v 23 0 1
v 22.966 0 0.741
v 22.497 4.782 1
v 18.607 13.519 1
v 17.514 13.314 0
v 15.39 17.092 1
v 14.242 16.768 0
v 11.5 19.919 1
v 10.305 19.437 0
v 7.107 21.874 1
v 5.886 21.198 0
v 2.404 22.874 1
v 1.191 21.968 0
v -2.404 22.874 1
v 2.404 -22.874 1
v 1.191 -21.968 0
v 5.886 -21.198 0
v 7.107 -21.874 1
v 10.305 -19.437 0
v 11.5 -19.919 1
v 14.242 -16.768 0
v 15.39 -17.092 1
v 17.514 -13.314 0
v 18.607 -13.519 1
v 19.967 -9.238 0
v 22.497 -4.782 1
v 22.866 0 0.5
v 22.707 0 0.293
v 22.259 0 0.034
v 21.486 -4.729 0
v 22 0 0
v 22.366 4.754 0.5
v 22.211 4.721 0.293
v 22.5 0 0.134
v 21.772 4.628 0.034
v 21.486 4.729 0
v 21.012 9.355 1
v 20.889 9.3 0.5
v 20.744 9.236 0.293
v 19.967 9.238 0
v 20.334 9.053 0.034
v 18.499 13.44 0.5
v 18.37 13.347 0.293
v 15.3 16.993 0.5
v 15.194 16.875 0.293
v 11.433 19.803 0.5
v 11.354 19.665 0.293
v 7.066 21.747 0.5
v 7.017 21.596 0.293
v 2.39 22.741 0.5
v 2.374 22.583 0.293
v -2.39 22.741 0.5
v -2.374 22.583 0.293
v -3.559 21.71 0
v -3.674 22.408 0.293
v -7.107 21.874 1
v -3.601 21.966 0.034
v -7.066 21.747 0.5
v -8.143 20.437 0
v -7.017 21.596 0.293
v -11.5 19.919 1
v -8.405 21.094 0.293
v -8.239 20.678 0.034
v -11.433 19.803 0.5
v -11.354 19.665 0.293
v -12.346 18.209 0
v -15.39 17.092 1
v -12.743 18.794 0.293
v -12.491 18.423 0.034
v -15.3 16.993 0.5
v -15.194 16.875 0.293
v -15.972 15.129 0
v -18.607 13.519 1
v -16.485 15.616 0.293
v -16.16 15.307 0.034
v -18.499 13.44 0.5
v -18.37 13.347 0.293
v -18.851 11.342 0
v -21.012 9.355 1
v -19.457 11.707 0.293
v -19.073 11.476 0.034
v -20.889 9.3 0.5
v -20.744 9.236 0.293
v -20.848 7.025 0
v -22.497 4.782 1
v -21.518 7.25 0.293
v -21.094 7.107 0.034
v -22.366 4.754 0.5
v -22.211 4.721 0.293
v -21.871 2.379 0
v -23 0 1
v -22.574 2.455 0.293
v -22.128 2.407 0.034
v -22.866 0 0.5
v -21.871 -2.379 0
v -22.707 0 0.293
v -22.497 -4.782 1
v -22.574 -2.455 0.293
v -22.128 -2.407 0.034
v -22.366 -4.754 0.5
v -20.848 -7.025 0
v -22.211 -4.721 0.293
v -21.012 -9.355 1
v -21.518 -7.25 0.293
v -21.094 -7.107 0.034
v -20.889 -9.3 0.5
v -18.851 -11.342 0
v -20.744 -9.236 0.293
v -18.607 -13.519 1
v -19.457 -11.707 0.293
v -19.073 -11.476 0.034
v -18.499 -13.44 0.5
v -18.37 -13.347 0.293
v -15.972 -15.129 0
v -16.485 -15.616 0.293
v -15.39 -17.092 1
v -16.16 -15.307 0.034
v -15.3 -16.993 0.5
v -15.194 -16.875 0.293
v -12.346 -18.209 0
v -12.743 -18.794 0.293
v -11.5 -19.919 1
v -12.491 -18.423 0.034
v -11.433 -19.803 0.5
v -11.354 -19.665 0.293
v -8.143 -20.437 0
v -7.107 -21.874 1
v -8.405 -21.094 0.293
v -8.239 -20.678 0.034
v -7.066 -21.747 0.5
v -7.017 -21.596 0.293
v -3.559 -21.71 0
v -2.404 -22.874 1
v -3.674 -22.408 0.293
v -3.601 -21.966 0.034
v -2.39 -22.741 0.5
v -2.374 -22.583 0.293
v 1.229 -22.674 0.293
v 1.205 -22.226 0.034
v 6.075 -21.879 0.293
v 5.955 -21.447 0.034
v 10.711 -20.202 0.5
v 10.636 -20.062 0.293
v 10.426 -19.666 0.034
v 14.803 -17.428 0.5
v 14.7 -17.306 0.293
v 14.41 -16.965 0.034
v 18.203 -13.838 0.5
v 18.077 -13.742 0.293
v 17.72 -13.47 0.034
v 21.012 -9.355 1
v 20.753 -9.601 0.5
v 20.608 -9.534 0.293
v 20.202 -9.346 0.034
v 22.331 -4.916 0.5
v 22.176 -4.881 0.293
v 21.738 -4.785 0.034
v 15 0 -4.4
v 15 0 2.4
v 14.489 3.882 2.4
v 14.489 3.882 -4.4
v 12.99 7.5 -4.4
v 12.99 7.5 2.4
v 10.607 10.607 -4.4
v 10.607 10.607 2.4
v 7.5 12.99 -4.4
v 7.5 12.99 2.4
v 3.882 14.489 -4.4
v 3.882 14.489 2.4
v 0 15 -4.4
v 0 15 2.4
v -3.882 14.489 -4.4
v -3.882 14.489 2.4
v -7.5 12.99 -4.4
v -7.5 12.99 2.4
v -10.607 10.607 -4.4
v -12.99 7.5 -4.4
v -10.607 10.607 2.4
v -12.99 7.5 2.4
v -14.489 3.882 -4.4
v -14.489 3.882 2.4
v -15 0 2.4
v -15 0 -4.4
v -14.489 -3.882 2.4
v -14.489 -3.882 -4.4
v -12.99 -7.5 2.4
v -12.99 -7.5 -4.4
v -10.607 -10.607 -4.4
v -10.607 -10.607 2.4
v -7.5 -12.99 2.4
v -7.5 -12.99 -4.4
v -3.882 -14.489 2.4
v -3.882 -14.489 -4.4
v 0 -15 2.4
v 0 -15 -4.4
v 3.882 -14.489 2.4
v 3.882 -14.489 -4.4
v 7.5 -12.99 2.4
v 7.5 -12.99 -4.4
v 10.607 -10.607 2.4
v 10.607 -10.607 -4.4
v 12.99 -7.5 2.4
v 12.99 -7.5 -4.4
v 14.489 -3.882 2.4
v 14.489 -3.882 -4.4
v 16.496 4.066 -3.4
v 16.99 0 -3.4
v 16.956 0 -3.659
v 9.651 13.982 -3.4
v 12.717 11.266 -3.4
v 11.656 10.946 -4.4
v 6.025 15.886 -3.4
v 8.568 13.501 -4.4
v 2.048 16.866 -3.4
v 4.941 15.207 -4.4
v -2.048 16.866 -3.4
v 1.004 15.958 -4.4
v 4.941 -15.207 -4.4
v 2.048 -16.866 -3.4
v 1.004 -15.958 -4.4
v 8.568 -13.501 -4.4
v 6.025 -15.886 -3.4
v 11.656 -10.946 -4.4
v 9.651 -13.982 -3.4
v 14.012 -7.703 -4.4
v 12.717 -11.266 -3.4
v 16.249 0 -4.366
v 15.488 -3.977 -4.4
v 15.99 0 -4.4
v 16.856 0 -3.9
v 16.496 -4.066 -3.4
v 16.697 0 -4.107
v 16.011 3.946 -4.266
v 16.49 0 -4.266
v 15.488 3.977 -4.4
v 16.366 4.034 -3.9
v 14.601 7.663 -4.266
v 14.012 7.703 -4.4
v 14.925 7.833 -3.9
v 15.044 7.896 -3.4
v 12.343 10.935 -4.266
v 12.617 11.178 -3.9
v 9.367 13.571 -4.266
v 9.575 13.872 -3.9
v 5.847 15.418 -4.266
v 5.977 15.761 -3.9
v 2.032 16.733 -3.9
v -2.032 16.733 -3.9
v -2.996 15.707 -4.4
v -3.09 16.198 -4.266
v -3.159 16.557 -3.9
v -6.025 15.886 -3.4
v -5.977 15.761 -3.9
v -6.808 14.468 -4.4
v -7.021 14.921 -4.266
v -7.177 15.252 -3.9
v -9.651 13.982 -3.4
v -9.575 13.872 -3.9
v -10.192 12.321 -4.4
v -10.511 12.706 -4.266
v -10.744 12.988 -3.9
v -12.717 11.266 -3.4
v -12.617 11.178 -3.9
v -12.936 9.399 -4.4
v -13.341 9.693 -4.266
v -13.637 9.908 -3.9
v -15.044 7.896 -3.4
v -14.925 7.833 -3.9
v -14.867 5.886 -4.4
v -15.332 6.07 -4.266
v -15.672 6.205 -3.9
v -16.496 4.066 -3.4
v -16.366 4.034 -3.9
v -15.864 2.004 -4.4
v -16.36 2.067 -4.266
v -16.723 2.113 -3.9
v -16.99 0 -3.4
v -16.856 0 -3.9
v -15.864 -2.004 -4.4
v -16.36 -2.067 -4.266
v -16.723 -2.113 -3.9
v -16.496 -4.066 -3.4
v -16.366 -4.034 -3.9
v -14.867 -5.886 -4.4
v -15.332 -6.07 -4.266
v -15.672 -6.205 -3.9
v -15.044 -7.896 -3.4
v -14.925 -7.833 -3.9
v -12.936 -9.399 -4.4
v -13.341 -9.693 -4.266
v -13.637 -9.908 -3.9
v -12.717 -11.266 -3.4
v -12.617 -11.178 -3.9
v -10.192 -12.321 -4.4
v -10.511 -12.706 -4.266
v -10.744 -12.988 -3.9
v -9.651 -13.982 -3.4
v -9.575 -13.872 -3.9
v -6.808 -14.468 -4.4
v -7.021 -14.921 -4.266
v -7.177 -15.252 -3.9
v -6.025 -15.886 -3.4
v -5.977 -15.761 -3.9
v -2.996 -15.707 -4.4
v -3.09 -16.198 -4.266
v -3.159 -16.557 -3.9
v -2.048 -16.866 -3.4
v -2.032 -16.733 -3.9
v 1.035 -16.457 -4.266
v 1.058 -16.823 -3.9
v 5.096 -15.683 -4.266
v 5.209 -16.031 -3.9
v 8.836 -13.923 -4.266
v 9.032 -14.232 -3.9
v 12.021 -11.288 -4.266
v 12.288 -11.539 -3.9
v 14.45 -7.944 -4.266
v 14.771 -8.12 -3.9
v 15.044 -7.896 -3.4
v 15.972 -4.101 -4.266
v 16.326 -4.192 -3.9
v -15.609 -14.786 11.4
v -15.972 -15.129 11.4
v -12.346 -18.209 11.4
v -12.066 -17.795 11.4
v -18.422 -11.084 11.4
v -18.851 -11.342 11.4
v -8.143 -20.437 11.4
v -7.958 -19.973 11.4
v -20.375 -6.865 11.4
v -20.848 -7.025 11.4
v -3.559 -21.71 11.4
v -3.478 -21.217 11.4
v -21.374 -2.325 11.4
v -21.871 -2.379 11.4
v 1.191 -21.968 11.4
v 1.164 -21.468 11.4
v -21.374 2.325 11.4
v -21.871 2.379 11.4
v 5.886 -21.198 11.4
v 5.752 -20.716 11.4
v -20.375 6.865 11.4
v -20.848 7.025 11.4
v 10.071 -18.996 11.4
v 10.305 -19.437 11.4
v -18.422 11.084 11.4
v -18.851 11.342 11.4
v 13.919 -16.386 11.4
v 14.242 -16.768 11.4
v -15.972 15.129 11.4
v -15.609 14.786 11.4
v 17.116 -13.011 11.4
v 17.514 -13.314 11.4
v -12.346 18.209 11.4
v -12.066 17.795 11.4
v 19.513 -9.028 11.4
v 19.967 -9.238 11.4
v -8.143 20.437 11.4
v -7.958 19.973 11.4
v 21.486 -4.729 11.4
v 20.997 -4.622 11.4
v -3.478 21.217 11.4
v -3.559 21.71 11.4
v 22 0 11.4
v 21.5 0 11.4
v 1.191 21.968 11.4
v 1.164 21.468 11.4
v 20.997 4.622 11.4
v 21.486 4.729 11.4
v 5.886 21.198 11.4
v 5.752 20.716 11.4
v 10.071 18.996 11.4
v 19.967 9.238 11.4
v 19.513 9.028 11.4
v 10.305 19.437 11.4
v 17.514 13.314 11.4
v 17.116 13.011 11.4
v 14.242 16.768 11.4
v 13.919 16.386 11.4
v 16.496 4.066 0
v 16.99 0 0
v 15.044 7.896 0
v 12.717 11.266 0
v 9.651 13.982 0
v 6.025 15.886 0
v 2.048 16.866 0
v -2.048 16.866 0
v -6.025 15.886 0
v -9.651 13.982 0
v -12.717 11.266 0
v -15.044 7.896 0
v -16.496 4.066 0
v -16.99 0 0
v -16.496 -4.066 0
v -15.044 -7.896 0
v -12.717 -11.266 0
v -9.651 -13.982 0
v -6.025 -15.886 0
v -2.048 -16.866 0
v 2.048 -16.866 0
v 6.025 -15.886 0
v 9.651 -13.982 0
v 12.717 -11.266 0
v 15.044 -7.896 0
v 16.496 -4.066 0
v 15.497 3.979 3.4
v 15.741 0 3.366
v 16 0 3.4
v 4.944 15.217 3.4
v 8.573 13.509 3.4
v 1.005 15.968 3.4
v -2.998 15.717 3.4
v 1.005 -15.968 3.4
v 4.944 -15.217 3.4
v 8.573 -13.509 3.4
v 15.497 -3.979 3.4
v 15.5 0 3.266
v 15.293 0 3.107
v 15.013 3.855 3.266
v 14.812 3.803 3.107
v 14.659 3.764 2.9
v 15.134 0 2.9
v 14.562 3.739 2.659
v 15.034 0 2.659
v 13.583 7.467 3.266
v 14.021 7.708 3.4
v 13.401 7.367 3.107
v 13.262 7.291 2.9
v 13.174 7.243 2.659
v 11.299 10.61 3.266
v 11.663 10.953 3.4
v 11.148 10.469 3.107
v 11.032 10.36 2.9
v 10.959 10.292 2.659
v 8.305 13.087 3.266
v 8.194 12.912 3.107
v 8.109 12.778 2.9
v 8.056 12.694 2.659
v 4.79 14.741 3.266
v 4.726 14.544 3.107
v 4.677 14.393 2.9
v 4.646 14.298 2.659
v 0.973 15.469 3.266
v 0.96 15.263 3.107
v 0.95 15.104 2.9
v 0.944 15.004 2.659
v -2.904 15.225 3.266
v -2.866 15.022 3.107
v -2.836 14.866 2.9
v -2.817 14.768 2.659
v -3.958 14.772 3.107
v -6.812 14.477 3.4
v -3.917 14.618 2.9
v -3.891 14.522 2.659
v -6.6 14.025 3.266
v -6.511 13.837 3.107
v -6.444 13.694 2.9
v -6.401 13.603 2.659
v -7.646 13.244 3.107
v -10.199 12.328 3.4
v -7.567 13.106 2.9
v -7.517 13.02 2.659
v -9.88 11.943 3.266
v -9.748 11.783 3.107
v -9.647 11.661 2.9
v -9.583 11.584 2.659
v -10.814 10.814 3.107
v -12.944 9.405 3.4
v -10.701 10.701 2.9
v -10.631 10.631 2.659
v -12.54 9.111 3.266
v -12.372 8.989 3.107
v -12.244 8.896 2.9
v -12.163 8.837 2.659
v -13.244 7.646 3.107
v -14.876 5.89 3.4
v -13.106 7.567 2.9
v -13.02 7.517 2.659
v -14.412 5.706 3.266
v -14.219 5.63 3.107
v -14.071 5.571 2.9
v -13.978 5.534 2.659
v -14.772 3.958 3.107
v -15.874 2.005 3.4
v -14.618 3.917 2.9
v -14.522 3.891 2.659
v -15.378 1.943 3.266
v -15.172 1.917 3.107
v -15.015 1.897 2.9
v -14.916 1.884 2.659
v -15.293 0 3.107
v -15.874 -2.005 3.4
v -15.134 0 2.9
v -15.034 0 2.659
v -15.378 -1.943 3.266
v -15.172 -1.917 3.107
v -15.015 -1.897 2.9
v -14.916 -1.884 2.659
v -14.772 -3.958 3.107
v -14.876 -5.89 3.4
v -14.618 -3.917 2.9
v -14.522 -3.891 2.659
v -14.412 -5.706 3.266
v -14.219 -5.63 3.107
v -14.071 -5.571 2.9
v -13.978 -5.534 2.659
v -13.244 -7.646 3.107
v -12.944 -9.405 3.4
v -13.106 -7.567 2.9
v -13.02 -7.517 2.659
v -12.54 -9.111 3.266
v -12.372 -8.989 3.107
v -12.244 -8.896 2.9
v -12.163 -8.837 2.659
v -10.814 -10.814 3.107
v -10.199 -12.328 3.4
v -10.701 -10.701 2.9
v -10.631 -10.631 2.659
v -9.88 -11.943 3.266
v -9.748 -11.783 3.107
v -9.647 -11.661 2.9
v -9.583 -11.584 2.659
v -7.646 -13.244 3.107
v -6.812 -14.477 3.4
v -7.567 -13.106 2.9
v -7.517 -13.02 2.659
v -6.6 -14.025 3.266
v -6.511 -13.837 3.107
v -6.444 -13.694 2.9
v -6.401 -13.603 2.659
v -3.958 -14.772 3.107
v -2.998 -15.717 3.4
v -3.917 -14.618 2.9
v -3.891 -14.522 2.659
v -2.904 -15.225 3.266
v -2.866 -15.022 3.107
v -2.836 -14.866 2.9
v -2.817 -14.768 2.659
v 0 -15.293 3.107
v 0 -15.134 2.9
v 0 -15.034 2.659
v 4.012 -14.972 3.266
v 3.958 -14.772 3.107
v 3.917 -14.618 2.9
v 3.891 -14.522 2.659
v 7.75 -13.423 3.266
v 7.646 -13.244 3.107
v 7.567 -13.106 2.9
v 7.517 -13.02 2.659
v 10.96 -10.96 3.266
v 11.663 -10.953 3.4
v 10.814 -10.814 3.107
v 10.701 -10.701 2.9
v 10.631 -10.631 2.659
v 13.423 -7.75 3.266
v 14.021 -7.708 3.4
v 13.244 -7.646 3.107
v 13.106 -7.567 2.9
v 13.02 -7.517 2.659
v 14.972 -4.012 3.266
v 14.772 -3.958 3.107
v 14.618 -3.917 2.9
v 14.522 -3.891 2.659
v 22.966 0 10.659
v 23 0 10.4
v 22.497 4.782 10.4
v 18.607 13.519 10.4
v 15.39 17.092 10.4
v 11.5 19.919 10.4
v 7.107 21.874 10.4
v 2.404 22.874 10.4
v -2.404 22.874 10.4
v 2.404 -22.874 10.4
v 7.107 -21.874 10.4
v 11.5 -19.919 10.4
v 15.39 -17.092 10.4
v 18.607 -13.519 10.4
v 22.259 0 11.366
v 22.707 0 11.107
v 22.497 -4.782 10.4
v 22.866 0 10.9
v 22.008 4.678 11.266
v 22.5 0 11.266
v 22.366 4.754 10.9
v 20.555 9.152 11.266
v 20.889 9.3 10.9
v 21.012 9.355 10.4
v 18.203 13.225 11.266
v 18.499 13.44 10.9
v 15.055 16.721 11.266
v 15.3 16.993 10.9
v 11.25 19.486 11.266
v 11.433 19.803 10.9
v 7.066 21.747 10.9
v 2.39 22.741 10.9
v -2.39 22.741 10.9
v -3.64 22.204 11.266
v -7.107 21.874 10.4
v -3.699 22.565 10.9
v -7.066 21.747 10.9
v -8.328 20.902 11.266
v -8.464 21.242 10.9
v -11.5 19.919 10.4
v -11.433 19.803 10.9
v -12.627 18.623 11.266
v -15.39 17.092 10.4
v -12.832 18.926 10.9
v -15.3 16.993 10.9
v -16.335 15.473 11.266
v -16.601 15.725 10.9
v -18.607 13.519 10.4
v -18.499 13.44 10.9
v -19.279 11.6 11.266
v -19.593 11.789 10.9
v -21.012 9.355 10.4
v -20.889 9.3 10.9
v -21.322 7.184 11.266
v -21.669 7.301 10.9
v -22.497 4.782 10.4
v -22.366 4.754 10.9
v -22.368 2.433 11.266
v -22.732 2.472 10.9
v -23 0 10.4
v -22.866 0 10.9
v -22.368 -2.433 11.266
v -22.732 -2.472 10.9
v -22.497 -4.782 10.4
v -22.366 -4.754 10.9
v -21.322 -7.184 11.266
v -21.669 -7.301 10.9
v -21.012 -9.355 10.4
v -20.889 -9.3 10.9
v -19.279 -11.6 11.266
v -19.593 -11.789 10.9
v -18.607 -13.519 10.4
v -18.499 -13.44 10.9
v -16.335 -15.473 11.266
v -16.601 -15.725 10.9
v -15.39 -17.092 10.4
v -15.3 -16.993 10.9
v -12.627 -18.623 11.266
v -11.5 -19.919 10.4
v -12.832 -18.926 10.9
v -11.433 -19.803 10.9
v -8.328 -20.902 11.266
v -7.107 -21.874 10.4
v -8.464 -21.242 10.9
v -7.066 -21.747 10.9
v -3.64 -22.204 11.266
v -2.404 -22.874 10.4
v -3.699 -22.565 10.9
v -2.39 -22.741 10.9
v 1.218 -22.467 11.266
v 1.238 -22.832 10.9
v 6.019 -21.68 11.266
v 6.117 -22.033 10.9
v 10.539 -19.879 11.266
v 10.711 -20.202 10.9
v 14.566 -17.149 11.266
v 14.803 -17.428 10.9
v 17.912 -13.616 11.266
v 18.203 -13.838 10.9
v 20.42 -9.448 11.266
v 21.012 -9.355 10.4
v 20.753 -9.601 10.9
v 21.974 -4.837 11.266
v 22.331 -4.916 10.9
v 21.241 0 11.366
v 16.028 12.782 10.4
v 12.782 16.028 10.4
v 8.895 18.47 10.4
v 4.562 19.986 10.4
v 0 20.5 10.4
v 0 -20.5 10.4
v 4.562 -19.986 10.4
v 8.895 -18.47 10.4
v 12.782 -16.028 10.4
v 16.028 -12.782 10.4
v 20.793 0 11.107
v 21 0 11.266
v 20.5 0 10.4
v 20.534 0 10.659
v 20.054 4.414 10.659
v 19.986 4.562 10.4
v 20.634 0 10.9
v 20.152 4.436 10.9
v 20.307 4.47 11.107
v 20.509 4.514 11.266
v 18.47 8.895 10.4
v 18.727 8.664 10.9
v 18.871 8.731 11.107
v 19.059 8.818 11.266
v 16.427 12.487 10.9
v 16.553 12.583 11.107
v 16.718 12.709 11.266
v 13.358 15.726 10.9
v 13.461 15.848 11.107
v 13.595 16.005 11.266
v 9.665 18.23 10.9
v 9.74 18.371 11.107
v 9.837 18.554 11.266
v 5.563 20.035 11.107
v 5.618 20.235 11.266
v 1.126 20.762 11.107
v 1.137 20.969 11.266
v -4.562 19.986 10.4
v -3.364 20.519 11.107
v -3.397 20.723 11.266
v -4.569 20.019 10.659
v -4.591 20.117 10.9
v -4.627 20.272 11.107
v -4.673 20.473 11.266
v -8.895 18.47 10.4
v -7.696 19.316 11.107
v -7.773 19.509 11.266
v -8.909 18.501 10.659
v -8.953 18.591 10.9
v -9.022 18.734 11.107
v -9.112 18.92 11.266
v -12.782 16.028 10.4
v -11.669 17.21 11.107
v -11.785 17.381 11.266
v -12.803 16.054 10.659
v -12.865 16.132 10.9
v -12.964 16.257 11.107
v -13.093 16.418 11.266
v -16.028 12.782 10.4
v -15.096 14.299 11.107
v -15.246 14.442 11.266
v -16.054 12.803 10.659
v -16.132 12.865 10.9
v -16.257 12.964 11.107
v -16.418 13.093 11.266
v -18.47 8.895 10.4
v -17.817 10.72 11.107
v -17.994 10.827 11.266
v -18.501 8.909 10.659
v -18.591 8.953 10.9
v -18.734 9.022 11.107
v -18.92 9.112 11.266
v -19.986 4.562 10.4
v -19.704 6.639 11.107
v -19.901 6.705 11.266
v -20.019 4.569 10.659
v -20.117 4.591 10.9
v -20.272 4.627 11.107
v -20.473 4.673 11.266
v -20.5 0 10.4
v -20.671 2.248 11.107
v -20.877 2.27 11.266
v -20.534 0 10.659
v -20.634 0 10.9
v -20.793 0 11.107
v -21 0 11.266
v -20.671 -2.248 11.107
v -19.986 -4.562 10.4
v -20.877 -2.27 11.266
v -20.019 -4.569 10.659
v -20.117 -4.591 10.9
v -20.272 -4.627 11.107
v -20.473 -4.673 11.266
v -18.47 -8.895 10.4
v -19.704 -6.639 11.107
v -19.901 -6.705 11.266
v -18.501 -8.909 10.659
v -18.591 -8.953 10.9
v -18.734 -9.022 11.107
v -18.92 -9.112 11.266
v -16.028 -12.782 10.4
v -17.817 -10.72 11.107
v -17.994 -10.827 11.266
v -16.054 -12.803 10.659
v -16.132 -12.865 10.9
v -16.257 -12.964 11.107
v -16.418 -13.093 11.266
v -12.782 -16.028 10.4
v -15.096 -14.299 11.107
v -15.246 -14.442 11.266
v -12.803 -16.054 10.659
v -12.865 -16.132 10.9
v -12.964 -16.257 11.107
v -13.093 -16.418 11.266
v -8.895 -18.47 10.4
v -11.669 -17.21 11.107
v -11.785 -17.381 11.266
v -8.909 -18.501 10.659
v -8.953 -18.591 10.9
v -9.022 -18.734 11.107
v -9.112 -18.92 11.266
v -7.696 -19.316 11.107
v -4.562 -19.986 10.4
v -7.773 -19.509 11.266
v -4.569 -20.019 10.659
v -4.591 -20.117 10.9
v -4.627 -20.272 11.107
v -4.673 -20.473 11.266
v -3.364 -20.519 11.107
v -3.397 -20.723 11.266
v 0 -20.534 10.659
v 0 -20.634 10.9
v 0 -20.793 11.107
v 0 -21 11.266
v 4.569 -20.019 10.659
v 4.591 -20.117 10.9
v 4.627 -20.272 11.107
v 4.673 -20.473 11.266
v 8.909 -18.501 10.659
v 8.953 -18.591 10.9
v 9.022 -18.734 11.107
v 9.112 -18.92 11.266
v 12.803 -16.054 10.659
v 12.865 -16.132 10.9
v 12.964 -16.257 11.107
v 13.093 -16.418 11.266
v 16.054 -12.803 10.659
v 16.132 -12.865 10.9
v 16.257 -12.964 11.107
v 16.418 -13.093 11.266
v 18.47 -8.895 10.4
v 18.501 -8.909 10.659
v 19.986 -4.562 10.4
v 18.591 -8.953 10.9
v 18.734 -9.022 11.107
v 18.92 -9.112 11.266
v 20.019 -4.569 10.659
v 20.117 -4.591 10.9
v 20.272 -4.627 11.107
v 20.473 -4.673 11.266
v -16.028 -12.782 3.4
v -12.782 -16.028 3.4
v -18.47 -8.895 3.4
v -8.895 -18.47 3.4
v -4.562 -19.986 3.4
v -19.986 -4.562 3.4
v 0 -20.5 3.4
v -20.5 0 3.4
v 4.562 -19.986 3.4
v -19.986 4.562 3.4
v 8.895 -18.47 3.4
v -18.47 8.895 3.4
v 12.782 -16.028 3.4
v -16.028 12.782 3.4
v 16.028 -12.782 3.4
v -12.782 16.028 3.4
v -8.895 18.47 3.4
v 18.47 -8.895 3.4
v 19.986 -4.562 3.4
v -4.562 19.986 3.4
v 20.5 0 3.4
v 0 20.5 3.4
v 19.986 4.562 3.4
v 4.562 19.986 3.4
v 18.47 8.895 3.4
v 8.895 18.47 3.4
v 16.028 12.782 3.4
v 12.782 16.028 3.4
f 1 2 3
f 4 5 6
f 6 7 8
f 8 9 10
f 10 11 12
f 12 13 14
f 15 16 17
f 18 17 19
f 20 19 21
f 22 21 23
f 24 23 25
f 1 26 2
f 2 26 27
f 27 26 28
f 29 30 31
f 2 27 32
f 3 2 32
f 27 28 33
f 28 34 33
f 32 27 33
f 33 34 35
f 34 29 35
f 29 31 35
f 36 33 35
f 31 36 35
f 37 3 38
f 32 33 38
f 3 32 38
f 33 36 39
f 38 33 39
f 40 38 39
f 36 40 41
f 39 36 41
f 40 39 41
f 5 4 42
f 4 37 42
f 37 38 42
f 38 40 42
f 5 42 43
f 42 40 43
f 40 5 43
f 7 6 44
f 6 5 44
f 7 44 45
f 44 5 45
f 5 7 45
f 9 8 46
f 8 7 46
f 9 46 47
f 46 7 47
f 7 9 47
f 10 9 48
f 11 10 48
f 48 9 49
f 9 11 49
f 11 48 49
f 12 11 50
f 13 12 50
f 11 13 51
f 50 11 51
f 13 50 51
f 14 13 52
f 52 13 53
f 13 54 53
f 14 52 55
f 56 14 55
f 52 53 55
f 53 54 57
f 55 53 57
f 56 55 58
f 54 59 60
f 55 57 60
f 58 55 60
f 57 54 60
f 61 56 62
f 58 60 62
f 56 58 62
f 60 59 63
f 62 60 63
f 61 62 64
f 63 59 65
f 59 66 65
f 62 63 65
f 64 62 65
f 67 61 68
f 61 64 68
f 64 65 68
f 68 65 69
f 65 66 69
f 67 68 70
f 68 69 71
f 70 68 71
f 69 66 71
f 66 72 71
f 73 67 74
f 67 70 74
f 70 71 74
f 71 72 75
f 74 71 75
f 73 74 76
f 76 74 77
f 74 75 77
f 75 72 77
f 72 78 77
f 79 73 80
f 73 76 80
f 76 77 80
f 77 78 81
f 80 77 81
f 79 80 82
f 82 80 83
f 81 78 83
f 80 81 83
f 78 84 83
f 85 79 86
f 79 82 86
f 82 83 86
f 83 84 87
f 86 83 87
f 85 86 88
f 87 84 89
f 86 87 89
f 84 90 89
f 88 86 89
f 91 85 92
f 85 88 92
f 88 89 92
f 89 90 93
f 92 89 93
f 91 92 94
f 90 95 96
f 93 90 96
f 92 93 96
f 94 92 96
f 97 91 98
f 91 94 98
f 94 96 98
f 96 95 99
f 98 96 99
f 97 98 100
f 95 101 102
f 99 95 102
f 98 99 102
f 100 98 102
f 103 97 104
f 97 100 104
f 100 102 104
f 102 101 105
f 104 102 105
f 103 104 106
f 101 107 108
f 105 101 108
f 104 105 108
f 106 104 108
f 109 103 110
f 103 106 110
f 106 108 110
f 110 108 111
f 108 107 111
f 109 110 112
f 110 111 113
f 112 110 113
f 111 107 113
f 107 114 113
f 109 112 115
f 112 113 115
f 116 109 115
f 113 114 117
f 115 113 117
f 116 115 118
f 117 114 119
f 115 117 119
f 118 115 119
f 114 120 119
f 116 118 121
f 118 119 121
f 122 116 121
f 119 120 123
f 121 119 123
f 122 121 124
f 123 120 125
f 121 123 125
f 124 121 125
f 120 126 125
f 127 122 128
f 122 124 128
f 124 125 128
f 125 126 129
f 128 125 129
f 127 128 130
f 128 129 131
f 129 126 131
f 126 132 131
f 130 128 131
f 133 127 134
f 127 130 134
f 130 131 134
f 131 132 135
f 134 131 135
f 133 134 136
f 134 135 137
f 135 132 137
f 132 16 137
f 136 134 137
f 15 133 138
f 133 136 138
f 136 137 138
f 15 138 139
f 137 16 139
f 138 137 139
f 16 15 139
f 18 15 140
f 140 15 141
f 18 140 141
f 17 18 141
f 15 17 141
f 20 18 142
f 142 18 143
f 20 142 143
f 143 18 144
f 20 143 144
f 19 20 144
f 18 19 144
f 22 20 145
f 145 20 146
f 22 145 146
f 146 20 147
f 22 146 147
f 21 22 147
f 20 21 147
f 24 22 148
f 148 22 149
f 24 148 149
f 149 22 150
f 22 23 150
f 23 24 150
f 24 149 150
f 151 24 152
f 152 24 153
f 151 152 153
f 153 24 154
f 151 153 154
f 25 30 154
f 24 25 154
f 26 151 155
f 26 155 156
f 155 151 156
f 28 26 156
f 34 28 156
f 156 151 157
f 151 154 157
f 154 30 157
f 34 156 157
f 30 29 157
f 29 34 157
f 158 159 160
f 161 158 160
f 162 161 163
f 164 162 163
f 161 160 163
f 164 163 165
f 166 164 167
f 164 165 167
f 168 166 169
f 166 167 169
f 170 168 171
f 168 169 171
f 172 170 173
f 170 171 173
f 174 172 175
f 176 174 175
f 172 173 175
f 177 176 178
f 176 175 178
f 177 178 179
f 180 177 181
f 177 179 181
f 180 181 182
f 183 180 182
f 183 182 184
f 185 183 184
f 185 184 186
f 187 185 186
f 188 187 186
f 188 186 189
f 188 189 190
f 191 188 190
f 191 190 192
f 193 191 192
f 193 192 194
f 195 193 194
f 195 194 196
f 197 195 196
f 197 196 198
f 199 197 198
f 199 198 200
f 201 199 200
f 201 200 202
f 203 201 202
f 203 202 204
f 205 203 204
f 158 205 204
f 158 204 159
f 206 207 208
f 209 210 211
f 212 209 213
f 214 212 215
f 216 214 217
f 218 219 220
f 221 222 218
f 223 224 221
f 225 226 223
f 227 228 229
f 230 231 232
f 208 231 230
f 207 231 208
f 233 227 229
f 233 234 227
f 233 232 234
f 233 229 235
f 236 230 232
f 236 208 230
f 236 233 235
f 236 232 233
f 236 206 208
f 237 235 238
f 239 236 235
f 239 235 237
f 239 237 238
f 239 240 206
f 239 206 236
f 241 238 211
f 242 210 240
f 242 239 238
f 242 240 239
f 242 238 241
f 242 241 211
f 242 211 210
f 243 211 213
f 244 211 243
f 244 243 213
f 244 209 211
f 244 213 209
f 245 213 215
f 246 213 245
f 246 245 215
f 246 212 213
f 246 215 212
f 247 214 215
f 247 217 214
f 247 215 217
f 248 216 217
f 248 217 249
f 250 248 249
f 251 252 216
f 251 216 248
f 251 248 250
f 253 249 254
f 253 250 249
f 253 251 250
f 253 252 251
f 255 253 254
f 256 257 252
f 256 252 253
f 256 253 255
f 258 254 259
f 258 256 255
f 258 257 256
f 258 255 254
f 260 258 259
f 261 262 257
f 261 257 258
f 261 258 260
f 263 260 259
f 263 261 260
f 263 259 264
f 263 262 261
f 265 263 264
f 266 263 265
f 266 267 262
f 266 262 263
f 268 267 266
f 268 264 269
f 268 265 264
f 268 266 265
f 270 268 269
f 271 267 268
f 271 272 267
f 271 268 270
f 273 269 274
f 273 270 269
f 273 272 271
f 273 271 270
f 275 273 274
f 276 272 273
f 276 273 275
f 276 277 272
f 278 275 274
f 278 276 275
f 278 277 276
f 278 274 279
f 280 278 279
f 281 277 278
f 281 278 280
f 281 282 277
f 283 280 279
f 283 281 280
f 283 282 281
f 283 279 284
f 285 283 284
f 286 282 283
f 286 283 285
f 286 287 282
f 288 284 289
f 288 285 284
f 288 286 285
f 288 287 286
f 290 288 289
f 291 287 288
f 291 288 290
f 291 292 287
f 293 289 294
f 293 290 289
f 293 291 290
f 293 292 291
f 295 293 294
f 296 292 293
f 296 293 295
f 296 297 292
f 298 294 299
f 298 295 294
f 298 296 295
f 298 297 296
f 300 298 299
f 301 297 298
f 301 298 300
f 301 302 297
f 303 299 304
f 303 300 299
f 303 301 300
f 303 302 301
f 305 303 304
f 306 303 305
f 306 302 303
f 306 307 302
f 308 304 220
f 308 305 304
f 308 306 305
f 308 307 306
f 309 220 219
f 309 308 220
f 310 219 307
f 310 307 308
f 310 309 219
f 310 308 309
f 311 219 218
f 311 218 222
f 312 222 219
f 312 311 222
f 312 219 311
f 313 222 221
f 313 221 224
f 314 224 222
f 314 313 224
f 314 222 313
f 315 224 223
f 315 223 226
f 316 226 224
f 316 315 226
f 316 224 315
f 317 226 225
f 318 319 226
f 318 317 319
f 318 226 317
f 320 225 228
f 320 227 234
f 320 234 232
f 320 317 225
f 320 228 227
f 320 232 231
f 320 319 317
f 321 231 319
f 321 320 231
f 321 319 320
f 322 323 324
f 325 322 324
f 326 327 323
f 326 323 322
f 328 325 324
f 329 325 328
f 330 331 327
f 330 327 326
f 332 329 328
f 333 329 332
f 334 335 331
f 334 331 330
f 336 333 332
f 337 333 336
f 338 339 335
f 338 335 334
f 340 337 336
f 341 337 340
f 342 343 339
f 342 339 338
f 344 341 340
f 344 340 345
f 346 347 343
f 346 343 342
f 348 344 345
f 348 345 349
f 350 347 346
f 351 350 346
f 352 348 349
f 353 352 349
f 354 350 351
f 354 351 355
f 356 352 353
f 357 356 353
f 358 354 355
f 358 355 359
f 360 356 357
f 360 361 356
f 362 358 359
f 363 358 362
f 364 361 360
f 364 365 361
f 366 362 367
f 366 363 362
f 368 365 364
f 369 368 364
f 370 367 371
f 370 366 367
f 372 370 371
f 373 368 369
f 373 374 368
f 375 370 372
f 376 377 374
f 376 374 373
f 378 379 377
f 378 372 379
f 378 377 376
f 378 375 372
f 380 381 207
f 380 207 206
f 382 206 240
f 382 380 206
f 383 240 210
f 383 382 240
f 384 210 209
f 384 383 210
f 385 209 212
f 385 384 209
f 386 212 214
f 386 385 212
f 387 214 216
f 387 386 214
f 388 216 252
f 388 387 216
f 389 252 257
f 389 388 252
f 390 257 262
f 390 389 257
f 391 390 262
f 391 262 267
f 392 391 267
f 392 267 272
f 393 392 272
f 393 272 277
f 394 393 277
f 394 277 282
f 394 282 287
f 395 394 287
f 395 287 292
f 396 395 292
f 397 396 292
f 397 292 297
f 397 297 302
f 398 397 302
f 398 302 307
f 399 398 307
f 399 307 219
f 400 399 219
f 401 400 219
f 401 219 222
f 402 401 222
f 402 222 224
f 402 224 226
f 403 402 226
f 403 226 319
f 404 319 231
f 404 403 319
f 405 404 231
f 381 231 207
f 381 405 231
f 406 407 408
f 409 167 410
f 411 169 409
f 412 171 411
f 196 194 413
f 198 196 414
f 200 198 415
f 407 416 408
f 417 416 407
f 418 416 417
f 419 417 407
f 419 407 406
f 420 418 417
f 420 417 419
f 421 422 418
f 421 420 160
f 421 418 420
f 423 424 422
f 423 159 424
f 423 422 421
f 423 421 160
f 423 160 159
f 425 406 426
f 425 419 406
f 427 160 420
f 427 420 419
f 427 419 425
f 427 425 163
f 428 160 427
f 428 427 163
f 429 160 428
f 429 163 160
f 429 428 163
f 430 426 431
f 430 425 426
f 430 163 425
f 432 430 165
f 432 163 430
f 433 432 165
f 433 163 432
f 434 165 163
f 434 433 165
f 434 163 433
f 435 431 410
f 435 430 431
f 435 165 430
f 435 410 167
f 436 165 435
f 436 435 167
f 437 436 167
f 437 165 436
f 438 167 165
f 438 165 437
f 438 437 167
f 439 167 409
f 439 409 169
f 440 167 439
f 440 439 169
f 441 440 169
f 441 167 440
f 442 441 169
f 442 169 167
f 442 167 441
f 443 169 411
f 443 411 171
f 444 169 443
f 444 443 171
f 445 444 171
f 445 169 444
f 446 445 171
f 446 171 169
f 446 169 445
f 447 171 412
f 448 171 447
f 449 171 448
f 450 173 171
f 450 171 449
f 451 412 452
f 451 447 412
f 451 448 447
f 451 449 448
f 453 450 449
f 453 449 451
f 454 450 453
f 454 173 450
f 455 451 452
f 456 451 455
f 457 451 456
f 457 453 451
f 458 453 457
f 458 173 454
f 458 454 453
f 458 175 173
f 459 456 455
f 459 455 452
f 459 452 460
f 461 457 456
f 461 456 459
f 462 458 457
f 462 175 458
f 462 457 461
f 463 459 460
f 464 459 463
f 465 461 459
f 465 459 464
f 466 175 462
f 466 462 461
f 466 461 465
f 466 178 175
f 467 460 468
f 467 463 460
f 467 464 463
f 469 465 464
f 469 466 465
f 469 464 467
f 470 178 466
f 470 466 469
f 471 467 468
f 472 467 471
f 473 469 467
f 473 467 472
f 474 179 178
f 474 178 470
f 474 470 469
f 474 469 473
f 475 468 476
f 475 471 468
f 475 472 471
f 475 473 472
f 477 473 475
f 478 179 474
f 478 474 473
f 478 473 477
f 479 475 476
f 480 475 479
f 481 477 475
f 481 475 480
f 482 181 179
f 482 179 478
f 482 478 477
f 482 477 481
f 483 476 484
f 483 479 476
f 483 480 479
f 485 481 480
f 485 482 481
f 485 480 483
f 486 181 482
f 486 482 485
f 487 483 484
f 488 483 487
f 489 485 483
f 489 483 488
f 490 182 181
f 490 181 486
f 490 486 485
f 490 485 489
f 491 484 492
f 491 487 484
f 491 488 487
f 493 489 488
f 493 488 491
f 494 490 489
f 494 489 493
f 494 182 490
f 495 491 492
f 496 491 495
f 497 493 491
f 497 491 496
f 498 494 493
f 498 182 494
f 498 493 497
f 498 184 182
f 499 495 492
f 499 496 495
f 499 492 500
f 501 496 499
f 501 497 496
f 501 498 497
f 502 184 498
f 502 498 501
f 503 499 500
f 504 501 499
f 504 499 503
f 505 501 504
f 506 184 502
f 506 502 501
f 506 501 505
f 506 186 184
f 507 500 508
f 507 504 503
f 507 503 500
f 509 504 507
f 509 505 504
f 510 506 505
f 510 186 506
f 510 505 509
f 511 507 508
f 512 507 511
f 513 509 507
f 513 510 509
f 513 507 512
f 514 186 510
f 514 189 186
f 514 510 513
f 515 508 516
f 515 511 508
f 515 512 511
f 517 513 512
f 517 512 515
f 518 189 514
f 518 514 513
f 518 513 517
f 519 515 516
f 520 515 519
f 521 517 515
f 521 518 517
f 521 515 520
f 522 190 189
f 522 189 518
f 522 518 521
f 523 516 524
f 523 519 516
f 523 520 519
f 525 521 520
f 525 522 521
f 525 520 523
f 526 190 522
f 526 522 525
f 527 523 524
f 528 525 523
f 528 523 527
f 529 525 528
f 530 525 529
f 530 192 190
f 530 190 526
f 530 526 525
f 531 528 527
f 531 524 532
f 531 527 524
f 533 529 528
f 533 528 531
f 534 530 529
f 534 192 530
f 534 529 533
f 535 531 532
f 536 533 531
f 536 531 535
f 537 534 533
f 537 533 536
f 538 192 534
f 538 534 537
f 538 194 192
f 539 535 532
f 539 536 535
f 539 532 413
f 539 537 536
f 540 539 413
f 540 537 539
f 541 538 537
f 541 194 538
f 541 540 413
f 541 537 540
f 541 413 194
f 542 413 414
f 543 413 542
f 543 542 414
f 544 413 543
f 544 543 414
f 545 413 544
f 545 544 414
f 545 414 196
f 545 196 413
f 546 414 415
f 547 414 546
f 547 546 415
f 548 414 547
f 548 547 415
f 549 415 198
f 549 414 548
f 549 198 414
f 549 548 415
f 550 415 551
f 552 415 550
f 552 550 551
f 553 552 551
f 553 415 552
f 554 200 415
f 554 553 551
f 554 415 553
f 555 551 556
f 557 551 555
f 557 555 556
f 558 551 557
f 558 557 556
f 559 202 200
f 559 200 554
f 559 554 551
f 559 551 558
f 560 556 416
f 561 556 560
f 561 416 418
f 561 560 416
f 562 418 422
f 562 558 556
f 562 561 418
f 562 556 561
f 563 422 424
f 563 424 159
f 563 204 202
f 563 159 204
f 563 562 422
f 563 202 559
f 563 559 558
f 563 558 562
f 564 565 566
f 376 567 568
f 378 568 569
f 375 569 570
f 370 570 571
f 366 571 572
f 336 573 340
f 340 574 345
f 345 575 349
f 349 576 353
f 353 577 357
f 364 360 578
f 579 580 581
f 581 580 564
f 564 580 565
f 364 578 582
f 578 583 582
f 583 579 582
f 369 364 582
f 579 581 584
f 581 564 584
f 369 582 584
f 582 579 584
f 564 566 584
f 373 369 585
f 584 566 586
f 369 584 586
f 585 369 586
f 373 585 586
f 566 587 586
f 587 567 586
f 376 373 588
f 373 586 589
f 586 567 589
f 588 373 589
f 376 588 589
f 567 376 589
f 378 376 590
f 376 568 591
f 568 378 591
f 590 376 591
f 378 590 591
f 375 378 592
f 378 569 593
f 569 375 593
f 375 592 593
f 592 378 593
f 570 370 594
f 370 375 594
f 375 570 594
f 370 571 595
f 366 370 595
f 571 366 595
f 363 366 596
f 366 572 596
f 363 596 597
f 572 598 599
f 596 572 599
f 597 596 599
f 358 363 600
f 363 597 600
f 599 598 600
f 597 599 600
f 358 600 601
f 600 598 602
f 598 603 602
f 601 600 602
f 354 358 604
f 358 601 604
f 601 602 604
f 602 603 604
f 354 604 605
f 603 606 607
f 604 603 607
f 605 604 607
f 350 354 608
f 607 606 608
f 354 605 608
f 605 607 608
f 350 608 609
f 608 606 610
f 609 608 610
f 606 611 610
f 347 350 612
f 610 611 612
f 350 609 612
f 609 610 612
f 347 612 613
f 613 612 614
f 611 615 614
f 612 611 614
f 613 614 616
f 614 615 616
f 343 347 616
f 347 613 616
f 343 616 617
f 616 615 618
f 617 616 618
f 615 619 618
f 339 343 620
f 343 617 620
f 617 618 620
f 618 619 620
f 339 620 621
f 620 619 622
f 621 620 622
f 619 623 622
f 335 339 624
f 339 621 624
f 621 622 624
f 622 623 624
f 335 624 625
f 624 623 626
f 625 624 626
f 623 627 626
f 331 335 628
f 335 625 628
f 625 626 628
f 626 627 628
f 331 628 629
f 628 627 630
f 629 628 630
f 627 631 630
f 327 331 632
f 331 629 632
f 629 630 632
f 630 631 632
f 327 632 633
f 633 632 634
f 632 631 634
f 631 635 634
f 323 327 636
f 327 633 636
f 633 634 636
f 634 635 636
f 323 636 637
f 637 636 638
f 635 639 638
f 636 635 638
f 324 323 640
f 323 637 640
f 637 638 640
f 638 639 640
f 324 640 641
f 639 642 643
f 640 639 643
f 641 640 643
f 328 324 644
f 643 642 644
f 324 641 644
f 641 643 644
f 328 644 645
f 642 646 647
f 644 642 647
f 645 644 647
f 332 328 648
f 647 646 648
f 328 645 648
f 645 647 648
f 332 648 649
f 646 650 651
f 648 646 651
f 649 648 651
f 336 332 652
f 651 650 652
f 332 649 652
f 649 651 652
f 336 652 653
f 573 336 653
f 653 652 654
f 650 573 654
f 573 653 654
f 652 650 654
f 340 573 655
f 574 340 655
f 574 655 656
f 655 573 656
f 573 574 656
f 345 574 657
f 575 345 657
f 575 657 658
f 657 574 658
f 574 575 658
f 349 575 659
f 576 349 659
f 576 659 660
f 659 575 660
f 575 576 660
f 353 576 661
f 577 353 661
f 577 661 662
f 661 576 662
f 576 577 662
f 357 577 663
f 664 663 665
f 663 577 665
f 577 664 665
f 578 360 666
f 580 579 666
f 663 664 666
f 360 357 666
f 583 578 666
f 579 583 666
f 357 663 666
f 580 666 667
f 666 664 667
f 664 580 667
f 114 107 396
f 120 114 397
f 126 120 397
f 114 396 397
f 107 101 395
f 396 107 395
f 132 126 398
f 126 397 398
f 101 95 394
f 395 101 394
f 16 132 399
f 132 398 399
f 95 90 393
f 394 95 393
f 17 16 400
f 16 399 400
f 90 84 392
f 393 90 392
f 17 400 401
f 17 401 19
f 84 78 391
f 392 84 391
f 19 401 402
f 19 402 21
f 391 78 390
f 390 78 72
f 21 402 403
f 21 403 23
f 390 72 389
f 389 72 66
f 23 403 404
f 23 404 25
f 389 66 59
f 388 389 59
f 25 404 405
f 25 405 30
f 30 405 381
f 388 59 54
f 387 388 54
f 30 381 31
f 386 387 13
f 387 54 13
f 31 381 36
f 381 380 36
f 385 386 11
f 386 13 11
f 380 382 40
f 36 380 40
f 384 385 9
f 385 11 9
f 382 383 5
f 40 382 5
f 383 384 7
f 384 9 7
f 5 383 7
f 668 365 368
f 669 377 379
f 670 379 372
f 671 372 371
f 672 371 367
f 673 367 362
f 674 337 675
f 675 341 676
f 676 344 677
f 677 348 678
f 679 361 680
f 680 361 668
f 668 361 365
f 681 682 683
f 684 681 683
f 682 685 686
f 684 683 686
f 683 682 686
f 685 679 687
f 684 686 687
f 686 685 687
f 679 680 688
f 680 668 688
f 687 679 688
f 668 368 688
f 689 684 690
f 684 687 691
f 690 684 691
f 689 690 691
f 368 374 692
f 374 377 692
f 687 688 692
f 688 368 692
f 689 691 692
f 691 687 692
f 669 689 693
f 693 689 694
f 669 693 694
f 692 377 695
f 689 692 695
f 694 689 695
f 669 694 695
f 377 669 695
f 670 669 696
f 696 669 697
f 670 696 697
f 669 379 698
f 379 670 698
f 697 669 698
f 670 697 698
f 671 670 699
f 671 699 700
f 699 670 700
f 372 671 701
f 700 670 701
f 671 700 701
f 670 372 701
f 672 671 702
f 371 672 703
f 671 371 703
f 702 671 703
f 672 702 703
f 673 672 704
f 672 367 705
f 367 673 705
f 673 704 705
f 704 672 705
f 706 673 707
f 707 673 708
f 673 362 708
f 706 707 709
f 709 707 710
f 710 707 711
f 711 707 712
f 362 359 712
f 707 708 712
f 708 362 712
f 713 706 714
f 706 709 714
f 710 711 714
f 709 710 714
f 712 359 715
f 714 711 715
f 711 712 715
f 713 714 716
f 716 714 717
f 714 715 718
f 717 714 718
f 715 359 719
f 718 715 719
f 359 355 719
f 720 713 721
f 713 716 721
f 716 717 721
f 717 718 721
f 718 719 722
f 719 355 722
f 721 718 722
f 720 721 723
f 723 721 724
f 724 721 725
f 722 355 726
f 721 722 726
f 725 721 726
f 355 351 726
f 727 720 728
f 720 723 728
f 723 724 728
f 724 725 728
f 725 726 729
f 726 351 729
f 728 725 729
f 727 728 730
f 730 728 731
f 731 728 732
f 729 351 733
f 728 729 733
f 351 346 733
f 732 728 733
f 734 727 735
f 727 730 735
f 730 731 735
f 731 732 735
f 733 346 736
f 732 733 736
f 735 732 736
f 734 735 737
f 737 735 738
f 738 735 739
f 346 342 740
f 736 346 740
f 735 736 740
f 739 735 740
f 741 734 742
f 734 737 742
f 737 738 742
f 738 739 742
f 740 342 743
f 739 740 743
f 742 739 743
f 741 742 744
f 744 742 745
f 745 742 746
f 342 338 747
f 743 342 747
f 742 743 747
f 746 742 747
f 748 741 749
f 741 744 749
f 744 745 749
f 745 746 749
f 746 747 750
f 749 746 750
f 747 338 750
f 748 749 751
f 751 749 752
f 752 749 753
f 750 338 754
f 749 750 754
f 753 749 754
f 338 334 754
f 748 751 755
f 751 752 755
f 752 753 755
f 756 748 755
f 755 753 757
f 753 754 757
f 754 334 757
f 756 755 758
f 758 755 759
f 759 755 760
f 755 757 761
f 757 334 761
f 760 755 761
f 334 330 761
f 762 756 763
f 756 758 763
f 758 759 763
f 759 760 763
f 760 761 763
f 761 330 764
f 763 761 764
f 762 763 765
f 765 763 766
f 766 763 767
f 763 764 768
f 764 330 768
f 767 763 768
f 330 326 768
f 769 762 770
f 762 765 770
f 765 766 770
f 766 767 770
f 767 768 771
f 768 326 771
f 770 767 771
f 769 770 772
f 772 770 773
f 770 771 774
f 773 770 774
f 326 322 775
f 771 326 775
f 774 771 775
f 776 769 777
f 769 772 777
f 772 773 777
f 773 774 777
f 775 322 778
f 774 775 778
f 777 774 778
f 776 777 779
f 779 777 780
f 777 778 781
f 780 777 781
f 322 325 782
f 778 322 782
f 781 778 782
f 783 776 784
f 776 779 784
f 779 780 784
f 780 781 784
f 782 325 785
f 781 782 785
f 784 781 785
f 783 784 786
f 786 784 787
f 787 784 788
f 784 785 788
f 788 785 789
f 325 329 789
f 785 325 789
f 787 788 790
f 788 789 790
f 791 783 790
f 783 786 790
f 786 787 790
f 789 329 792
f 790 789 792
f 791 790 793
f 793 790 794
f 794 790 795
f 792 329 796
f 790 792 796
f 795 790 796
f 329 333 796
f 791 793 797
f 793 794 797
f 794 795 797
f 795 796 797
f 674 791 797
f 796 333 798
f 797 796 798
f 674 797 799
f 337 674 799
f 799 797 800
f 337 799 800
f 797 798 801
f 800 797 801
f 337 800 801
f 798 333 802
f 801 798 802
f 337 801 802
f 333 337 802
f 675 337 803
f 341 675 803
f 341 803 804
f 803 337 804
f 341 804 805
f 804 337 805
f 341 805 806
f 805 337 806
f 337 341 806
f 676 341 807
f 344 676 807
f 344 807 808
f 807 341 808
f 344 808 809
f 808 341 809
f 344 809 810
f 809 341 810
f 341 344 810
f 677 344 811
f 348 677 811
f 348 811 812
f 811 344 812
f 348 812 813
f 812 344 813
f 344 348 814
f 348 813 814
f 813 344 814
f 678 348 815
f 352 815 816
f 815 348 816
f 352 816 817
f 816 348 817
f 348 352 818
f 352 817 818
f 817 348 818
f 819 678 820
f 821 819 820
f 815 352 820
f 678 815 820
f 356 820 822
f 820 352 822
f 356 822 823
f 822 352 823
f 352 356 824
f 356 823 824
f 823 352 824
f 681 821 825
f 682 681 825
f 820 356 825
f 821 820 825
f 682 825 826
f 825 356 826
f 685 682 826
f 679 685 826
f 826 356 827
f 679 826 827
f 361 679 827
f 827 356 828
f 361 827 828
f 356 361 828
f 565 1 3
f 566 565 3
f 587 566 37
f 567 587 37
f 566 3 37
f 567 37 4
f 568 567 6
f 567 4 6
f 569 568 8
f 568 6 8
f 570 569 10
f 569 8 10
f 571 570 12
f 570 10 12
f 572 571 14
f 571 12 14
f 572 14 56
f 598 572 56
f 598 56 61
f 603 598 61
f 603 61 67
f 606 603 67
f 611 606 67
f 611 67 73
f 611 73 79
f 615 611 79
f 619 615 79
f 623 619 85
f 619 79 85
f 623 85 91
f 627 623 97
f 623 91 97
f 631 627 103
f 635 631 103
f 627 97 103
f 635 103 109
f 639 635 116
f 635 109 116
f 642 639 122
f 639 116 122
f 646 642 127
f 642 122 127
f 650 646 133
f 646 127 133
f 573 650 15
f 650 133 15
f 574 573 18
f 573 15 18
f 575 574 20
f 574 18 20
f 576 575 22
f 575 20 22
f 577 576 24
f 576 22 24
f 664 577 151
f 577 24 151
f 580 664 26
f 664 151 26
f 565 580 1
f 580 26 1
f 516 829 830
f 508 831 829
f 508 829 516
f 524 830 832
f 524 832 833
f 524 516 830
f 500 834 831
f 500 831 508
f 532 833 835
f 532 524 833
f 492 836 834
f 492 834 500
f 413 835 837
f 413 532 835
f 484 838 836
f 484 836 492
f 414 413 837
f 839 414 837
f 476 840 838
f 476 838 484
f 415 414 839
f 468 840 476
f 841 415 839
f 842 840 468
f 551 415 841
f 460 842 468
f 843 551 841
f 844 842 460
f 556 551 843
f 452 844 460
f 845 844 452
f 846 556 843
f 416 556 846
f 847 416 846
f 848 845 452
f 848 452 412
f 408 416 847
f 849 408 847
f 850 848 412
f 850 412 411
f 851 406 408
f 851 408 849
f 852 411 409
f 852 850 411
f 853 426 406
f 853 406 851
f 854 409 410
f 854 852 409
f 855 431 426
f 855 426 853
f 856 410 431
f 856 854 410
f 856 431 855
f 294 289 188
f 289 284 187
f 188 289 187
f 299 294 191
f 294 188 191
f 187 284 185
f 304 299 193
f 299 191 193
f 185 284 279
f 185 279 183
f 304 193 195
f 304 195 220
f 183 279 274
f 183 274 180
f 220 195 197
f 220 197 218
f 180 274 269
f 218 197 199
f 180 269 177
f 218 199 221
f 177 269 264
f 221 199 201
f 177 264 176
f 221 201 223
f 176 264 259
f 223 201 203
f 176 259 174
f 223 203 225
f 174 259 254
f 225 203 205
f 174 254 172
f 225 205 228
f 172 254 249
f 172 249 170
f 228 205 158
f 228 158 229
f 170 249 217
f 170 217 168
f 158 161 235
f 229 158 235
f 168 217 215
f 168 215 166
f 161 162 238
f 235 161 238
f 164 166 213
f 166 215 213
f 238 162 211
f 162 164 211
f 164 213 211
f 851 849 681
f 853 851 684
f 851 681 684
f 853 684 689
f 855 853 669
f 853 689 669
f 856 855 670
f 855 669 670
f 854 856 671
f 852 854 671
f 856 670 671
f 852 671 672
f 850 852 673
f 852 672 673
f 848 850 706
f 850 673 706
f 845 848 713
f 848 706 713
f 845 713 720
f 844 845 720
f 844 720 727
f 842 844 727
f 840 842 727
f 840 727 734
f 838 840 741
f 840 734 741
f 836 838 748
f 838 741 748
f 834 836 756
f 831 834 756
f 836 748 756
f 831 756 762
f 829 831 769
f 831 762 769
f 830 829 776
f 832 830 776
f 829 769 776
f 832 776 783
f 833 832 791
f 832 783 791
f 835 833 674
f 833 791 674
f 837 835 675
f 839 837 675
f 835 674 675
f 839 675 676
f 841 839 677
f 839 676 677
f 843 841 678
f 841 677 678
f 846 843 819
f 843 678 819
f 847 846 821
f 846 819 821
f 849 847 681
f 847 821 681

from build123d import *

# Parameters (mm, degrees)
SKETCH1_R           = 23
BOSS_EXTRUDE1_DEPTH = 11.4
SKETCH2_R           = 20.5
CUT_EXTRUDE1_DEPTH  = 8
SKETCH3_R           = 16.99
BOSS_EXTRUDE2_DEPTH = 7.8
SKETCH4_R           = 15
CUT_EXTRUDE2_DEPTH  = 34.496268449
FILLET1_R           = 1
FILLET3_R           = 1
FILLET4_R           = 1


with BuildPart() as part:
    # Sketch1 → Boss-Extrude1 (new body)
    with BuildSketch(Plane.XY):
        Circle(SKETCH1_R)
    extrude(amount=BOSS_EXTRUDE1_DEPTH)

    # Sketch2 → Cut-Extrude1 (cut)
    with BuildSketch(Plane.XY.offset(11.4)):
        Circle(SKETCH2_R)
    extrude(amount=-CUT_EXTRUDE1_DEPTH, mode=Mode.SUBTRACT)

    # Sketch3 → Boss-Extrude2 (add)
    with BuildSketch(Plane.XY.offset(3.4)):
        Circle(SKETCH3_R)
    extrude(amount=-BOSS_EXTRUDE2_DEPTH)

    # Sketch4 → Cut-Extrude2 (cut, through all)
    with BuildSketch(Plane.XY.offset(3.4)):
        Circle(SKETCH4_R)
    extrude(amount=-CUT_EXTRUDE2_DEPTH, mode=Mode.SUBTRACT)

    # Fillet1
    fillet1_edges = [part.edges().sort_by_distance(p)[0] for p in [
        (-15, 0, 3.4),
    ]]
    fillet(fillet1_edges, radius=FILLET1_R)

    # Fillet3
    fillet3_edges = [part.edges().sort_by_distance(p)[0] for p in [
        (-16.99, 0, -4.4),
        (-23, 0, 11.4),
        (-20.5, 0, 11.4),
    ]]
    fillet(fillet3_edges, radius=FILLET3_R)

    # Fillet4
    fillet4_edges = [part.edges().sort_by_distance(p)[0] for p in [
        (-23, 0, 0),
    ]]
    fillet(fillet4_edges, radius=FILLET4_R)


solid = part.part
